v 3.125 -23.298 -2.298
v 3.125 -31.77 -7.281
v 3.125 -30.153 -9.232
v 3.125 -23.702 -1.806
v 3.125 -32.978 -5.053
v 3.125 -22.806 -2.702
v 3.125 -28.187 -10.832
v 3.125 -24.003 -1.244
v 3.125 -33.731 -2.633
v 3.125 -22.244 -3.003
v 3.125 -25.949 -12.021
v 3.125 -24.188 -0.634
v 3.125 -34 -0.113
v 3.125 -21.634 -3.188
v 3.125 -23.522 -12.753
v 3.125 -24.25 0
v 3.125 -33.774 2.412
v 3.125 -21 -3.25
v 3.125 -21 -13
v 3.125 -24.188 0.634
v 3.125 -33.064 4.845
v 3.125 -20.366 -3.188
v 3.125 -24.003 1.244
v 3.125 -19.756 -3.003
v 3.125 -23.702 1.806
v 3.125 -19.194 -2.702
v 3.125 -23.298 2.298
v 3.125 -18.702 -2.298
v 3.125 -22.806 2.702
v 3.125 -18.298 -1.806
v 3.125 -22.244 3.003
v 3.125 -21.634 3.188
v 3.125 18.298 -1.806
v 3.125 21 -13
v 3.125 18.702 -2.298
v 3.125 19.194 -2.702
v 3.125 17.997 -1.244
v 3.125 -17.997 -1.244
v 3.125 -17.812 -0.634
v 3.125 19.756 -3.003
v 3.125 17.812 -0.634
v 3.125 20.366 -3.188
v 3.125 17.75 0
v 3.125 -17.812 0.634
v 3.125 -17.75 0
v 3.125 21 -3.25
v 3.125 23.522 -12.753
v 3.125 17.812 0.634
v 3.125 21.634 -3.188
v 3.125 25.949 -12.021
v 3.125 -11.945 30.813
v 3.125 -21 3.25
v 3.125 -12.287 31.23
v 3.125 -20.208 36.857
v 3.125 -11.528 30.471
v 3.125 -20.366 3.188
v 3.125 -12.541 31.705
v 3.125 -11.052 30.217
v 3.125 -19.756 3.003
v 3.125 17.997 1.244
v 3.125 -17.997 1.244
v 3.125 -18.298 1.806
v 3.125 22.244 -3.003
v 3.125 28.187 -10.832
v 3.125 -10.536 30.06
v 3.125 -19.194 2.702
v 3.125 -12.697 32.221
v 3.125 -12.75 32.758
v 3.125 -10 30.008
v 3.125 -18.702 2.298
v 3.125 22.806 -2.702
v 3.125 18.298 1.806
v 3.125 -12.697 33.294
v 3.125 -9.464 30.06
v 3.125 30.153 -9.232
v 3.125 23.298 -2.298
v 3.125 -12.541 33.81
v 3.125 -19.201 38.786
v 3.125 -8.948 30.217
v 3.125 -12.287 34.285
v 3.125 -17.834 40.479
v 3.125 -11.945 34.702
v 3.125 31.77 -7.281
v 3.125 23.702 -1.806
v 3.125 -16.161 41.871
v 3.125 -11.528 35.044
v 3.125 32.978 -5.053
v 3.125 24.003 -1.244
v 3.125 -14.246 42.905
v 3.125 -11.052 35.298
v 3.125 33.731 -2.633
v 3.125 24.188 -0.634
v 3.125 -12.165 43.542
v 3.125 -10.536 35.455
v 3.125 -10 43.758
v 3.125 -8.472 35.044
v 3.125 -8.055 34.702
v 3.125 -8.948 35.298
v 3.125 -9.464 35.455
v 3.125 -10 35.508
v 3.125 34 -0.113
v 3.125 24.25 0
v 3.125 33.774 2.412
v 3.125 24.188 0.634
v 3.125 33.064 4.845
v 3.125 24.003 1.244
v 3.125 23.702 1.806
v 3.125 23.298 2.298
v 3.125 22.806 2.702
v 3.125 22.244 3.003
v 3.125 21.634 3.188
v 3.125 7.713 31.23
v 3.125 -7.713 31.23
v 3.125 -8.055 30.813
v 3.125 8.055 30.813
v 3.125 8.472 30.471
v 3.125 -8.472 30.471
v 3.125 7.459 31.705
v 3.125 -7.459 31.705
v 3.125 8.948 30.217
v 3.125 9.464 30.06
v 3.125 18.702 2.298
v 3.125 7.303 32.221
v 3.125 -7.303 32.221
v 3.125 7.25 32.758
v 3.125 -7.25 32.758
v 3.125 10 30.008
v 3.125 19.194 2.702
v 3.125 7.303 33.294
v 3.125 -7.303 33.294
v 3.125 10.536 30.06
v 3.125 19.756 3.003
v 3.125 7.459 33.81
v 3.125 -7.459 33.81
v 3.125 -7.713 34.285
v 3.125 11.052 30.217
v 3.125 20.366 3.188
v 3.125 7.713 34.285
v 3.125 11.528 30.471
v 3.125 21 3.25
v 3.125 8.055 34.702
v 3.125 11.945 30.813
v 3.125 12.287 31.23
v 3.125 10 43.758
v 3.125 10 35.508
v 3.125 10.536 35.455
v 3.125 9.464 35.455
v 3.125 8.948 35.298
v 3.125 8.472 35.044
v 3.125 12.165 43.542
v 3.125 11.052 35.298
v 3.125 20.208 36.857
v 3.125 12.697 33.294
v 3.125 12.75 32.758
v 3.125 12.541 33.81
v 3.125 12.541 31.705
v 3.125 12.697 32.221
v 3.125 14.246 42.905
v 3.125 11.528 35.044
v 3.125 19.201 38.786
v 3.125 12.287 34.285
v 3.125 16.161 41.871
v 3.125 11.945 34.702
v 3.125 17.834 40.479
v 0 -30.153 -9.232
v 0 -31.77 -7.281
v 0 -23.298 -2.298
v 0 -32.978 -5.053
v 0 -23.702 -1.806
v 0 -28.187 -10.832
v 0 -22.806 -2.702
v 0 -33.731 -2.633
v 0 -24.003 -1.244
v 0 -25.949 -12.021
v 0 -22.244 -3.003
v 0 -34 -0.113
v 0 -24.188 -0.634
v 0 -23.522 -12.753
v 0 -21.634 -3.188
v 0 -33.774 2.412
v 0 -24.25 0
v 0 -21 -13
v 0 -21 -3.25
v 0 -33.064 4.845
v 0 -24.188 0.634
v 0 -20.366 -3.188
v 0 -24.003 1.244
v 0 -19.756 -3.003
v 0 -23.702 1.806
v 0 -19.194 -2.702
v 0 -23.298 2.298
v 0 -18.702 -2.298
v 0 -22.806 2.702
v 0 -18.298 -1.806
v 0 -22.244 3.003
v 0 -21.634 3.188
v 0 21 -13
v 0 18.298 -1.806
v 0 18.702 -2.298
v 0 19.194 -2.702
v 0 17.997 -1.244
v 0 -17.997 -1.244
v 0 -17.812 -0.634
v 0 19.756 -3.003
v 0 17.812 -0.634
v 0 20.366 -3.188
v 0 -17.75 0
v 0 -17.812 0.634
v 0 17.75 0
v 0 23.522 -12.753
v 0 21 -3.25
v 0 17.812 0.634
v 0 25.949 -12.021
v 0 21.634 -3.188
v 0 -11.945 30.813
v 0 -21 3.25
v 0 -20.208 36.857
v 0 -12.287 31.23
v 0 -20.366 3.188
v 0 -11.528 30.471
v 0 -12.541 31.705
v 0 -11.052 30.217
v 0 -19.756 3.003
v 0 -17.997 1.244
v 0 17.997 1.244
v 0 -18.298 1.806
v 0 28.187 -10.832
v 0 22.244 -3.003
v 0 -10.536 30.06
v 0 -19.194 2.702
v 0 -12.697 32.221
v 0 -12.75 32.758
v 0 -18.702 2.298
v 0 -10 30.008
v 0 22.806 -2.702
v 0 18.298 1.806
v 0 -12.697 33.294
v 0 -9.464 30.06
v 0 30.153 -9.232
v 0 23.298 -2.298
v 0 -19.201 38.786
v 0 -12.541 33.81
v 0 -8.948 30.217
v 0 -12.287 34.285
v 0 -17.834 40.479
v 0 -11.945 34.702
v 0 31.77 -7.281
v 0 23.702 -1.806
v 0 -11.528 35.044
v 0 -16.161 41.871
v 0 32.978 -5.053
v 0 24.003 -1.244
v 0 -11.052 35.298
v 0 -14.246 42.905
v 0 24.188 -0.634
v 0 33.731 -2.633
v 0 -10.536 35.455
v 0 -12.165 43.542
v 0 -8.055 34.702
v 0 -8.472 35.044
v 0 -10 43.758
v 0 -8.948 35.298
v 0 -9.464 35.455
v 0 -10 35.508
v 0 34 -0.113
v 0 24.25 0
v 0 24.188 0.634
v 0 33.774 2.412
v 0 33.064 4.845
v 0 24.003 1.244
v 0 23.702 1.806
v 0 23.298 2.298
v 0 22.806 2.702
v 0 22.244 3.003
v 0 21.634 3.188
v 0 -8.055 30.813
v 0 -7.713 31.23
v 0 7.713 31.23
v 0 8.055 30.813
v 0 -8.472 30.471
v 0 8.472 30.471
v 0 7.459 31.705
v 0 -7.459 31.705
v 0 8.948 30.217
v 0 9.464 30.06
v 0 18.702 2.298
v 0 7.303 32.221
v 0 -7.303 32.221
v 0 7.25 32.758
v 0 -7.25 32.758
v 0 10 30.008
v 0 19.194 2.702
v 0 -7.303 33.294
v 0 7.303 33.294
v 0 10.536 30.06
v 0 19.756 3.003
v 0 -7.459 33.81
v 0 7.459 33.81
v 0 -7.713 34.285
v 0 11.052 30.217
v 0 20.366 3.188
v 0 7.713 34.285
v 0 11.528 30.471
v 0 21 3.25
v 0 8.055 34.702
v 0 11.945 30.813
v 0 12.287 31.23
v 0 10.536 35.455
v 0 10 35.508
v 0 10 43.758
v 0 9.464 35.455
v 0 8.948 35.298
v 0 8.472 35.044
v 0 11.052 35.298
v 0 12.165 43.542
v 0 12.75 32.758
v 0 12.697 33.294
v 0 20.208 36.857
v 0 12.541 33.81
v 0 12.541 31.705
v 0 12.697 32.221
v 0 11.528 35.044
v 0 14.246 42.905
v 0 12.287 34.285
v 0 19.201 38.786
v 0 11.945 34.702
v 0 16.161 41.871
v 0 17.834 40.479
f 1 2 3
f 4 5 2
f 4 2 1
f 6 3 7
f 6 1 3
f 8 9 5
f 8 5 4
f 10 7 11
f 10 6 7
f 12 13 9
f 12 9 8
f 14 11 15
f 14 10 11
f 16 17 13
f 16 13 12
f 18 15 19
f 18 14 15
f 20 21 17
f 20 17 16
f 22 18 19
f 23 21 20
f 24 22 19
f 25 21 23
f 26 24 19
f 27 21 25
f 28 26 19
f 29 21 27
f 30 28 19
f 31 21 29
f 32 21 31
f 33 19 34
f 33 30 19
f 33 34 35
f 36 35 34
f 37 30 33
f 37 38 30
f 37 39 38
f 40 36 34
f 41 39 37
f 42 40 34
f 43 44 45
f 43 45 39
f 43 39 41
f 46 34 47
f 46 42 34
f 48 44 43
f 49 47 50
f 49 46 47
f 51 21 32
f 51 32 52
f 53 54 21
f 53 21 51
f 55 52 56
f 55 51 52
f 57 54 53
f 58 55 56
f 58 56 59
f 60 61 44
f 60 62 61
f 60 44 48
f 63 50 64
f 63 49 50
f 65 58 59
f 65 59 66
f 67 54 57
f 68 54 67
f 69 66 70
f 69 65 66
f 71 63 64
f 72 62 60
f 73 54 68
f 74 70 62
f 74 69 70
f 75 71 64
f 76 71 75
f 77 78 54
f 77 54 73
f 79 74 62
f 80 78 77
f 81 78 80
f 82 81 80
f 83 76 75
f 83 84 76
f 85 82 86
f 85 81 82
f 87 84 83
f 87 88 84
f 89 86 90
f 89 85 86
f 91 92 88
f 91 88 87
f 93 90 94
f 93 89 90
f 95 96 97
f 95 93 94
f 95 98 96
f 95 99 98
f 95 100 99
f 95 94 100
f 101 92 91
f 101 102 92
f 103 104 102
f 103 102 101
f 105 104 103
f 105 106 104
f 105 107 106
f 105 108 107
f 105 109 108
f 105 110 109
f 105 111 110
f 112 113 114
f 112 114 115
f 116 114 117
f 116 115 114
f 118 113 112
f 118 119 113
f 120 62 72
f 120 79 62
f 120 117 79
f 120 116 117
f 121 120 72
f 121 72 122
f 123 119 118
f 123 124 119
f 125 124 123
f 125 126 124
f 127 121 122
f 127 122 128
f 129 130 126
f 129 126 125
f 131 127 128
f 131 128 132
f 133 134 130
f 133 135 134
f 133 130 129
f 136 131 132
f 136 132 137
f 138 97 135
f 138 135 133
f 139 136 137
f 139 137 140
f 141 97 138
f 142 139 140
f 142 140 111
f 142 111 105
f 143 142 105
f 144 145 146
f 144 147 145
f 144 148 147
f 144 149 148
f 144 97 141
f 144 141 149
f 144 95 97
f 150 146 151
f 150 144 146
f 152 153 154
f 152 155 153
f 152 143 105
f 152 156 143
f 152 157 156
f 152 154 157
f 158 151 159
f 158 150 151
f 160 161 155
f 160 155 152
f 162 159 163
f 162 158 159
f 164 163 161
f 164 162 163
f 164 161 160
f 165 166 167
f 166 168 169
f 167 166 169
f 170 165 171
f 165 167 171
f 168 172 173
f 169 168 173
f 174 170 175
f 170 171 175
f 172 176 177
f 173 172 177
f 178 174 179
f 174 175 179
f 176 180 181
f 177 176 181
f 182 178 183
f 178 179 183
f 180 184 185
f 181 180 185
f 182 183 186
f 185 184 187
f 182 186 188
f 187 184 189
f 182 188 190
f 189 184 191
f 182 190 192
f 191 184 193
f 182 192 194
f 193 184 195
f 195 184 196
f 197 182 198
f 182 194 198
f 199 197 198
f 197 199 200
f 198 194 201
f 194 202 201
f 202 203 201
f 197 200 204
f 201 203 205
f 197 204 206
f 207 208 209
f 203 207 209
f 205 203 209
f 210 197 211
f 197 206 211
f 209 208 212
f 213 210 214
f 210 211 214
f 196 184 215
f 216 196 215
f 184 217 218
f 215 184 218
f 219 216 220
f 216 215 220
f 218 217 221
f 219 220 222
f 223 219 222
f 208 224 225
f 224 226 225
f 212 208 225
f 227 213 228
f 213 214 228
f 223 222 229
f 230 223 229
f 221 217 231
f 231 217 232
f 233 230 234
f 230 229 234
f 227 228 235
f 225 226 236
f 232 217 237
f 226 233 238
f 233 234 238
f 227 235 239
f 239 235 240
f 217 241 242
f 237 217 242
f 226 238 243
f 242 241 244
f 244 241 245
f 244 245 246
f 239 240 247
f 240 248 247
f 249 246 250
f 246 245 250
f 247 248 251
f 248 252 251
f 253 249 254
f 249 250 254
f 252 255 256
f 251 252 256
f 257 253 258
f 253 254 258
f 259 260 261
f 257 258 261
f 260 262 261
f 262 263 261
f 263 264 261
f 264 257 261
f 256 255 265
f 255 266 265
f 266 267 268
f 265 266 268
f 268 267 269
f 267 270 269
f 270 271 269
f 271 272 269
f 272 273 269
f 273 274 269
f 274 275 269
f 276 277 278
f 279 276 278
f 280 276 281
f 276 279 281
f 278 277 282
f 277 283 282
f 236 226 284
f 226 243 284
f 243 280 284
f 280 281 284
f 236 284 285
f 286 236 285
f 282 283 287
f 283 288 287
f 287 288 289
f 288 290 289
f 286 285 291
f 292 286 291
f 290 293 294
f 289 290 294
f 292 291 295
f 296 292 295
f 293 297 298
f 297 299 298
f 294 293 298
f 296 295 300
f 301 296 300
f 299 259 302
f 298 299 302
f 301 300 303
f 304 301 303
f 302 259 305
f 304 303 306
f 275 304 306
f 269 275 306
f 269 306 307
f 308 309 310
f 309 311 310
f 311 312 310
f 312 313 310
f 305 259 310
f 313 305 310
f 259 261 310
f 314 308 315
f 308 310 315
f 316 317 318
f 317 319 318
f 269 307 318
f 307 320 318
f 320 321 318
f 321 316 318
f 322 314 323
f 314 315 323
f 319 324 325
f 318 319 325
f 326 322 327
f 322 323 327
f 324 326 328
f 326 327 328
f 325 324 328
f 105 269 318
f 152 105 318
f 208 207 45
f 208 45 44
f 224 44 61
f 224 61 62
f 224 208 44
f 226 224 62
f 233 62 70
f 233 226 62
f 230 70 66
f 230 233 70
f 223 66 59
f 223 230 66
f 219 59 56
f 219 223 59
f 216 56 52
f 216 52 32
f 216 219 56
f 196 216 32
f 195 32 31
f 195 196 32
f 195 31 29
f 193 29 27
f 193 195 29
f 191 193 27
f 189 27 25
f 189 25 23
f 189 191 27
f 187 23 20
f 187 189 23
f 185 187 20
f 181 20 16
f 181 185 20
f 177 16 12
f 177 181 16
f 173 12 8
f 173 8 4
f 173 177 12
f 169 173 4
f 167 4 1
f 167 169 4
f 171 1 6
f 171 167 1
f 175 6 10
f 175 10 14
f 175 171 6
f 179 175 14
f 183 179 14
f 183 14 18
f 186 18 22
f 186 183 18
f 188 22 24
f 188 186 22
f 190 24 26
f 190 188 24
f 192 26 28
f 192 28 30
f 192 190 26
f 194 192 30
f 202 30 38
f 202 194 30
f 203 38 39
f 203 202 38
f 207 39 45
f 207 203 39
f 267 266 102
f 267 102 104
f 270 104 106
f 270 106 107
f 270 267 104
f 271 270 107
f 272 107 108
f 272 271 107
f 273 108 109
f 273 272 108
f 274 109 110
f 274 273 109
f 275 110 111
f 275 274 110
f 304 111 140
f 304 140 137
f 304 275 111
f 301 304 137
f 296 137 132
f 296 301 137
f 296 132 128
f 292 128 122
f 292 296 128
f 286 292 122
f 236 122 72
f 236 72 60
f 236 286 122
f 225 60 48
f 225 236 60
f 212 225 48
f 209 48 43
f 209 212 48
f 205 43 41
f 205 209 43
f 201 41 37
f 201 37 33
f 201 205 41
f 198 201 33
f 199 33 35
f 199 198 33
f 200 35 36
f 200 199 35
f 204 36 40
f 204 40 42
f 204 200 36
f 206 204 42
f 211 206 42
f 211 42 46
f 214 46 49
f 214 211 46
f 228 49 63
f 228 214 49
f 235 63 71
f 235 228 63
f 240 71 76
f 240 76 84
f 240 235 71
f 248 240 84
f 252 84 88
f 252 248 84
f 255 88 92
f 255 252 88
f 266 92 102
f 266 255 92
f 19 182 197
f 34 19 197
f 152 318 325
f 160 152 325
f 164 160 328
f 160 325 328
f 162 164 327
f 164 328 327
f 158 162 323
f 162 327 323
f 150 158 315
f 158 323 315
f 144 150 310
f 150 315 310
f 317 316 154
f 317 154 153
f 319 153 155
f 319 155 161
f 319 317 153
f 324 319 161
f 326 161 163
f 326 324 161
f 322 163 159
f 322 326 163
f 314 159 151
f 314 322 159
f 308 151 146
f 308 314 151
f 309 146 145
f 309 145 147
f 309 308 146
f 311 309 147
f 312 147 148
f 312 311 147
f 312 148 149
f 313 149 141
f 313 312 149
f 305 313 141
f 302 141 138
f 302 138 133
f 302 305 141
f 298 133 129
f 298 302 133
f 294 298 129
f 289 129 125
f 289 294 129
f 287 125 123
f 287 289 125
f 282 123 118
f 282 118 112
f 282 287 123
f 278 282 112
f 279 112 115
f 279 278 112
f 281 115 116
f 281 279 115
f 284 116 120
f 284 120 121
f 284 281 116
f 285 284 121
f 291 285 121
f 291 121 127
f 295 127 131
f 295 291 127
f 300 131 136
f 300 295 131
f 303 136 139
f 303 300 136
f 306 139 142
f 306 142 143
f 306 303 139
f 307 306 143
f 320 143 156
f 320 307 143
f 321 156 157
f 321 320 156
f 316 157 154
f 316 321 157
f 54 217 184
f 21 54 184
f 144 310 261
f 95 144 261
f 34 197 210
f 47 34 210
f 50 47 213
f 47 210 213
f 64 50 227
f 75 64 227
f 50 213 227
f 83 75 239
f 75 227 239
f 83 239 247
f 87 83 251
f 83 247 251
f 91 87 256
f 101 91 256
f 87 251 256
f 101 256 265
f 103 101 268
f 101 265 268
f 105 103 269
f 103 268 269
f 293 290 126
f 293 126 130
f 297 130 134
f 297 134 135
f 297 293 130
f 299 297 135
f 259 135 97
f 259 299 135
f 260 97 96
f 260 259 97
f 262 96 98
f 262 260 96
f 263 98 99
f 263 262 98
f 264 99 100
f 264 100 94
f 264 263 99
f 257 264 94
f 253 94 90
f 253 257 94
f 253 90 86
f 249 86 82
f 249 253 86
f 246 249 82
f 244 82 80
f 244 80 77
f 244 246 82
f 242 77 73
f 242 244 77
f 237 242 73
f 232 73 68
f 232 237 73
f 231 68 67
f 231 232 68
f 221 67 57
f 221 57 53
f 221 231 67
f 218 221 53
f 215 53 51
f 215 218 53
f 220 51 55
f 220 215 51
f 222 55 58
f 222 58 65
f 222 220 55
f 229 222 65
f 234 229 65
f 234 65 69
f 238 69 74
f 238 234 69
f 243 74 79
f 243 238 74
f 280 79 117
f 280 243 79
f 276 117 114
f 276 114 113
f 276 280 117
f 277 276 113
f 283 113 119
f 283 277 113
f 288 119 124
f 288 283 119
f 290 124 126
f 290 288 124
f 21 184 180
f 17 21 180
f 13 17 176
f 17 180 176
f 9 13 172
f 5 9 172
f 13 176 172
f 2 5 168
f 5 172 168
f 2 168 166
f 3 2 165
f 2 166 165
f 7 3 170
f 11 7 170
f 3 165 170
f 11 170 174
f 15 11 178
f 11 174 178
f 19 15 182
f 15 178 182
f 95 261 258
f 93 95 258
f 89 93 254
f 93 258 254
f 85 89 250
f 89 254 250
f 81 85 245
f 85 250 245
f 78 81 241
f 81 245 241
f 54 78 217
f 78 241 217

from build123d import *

# Parameters (mm, degrees)
F1_R     = 3.25
F1_R_2   = 2.75
F2_DEPTH = 3.125


with BuildPart() as f2:
    # F1 (on Right) → F2 (new body)
    with BuildSketch(Plane.YZ):
        with BuildLine():
            Line((10, 43.757633), (-10, 43.757633))
            ThreePointArc((-10, 43.757633), (-16.160663, 41.870603), (-20.207625, 36.856948))
            Line((-20.207625, 36.856948), (-33.063557, 4.844646))
            ThreePointArc((-33.063557, 4.844646), (-31.769875, -7.280783), (-21, -13))
            Line((-21, -13), (21, -13))
            ThreePointArc((21, -13), (31.769875, -7.280783), (33.063557, 4.844646))
            Line((33.063557, 4.844646), (20.207625, 36.856948))
            ThreePointArc((20.207625, 36.856948), (16.160663, 41.870603), (10, 43.757633))
        make_face()
        with Locations((-21, 0)):
            Circle(F1_R, mode=Mode.SUBTRACT)
        with Locations((21, 0)):
            Circle(F1_R, mode=Mode.SUBTRACT)
        with Locations((-10, 32.757633)):
            Circle(F1_R_2, mode=Mode.SUBTRACT)
        with Locations((10, 32.757633)):
            Circle(F1_R_2, mode=Mode.SUBTRACT)
    extrude(amount=F2_DEPTH)


solid = f2.part
